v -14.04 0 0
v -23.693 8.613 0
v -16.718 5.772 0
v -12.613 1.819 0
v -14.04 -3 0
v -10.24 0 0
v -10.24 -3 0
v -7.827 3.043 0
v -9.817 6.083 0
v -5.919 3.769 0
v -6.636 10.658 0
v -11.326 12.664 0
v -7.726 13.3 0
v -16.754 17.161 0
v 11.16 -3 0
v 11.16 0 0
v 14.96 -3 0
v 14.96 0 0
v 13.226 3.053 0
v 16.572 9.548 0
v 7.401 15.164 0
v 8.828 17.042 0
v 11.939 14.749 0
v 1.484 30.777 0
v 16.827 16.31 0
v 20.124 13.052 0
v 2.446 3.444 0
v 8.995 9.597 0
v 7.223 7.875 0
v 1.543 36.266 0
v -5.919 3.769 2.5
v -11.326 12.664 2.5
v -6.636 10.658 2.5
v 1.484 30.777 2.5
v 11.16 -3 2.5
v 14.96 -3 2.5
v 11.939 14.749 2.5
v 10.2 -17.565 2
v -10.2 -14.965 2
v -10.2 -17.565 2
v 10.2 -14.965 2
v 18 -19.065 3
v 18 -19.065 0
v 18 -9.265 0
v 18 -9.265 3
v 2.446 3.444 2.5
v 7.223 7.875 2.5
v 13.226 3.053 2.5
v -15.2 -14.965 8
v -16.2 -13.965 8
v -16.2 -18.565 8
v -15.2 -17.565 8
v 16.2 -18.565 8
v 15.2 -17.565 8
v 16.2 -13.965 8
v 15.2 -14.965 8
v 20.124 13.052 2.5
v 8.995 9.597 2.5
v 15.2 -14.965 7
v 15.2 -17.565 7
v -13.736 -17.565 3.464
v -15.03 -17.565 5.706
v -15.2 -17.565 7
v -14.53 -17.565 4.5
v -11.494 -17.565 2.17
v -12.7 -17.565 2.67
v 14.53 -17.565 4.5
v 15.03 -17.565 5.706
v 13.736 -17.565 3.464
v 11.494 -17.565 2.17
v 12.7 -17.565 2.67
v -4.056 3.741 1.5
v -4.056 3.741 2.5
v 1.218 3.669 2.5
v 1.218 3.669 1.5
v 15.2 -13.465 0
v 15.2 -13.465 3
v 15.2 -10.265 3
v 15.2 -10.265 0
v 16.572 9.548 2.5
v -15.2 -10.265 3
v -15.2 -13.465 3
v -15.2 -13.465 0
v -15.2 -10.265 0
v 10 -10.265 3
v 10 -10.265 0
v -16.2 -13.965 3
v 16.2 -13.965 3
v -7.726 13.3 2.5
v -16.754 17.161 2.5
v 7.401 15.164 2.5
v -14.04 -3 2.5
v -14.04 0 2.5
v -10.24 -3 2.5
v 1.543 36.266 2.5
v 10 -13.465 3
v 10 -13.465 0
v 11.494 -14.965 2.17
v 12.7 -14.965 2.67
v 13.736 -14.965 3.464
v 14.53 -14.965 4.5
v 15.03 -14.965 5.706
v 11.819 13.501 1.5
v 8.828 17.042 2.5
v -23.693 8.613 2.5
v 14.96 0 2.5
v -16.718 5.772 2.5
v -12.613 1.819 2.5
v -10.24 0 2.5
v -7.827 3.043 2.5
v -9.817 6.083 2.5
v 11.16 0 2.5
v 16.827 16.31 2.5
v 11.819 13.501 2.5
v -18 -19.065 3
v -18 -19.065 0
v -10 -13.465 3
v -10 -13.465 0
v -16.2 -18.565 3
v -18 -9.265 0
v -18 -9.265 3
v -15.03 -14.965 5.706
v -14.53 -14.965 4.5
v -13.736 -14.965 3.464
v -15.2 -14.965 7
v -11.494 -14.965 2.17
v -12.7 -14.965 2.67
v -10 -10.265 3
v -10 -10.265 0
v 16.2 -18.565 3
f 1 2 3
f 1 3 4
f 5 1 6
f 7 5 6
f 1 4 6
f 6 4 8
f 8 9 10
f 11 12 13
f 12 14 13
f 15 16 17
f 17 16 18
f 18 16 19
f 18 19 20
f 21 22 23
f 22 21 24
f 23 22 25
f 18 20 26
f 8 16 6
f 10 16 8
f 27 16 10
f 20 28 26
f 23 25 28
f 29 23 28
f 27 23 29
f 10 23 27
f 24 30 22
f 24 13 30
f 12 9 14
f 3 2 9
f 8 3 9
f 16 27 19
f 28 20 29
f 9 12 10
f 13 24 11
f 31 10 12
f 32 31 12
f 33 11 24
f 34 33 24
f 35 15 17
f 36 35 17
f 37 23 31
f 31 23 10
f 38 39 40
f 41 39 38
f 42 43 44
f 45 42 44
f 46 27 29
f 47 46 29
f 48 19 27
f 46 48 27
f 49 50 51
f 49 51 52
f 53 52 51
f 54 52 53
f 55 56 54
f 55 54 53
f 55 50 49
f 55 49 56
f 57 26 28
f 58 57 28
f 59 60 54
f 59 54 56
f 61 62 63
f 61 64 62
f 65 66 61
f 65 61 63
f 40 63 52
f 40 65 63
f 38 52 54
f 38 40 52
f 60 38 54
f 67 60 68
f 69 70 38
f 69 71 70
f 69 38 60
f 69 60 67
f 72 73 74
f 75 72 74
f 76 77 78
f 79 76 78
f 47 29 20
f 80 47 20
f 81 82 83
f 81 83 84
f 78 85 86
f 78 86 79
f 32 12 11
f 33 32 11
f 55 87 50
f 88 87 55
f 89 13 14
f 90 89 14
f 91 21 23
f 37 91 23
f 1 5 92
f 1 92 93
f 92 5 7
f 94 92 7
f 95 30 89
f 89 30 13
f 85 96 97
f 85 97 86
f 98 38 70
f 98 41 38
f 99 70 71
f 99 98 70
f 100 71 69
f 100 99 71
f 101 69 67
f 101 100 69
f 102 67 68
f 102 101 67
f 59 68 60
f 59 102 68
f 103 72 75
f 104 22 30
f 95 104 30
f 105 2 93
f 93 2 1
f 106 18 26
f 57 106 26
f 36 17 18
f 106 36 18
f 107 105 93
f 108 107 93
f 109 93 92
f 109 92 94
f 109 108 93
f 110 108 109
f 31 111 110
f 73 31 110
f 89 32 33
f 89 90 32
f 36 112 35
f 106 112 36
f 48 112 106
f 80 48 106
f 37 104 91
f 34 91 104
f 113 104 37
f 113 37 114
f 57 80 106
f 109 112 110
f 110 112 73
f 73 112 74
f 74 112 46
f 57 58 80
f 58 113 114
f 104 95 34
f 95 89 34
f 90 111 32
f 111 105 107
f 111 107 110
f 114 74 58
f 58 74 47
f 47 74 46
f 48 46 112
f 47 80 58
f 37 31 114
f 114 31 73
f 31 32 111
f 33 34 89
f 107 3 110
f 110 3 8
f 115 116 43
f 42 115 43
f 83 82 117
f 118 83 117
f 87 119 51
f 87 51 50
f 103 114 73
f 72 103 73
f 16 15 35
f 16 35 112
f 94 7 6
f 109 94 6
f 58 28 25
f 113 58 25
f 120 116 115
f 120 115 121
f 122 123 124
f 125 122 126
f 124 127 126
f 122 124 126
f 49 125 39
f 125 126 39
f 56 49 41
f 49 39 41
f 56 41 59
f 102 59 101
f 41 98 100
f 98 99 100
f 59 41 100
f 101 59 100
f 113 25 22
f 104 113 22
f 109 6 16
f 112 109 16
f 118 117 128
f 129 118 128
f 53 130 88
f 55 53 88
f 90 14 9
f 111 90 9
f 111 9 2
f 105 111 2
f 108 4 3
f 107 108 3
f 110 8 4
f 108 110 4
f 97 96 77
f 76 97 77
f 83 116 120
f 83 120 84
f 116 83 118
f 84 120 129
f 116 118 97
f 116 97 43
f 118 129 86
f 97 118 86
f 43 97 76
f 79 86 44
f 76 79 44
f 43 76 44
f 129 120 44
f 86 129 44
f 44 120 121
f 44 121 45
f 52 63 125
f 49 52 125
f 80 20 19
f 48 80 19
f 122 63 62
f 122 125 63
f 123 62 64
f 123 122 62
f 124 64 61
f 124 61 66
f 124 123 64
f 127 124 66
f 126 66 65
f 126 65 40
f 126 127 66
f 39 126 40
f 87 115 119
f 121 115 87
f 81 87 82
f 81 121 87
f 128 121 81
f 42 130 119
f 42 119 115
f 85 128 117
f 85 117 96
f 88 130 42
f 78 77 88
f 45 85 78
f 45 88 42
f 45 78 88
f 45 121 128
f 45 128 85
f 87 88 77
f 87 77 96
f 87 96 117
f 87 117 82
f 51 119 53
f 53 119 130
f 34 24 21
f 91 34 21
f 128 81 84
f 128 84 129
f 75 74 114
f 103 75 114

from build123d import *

# Parameters (mm, degrees)
F0_W      = 3.8
F0_H      = 3
F1_DEPTH  = 2.5
F2_W      = 36
F2_H      = 9.8
F3_DEPTH  = 3
F4_W      = 5.2
F4_H      = 3.2
F5_DEPTH  = 25
F6_W      = 32.4
F6_H      = 4.6
F6_W_2    = 30.4
F6_H_2    = 2.6
F7_DEPTH  = 5
F8_DEPTH  = 1
F9_R      = 5
F11_DEPTH = 1


with BuildPart() as f1:
    # F0 (on Top) → F1 (new body)
    with BuildSketch(Plane.XY):
        Polygon((-23.693, 8.612575), (-14.039942, 0), (-10.239942, 0), (11.160058, 0), (14.960058, 0), (20.123731, 13.051745), (8.994607, 9.597098), (16.826606, 16.309944), (8.827872, 17.042117), (1.543192, 36.265995), (-7.726343, 13.299686), (-16.753706, 17.161402), (-9.817263, 6.082774), align=None)
        Polygon((-16.717711, 5.771867), (-7.826785, 3.043432), (-12.61339, 1.818523), align=None, mode=Mode.SUBTRACT)
        Polygon((2.446211, 3.444351), (7.223333, 7.875025), (16.571729, 9.547895), (13.225986, 3.053221), align=None, mode=Mode.SUBTRACT)
        Polygon((-5.918919, 3.769303), (-11.326318, 12.664368), (-6.635851, 10.657885), (1.48446, 30.776861), (7.400632, 15.164399), (11.938927, 14.748982), align=None, mode=Mode.SUBTRACT)
        with Locations((-12.139942, -1.5)):
            Rectangle(F0_W, F0_H)
        with Locations((13.060058, -1.5)):
            Rectangle(F0_W, F0_H)
    extrude(amount=F1_DEPTH)

    # F10 (on face) → F11 (cut)
    with BuildSketch(Plane.XY.offset(2.5)):
        Polygon((11.819168, 13.501456), (-4.055955, 3.74083), (1.217624, 3.668761), align=None)
    extrude(amount=-F11_DEPTH, mode=Mode.SUBTRACT)


with BuildPart() as f3:
    # F2 (on Top) → F3 (new body)
    with BuildSketch(Plane.XY):
        with Locations((0, -14.164851)):
            Rectangle(F2_W, F2_H)
    extrude(amount=F3_DEPTH)

    # F4 (on face) → F5 (cut)
    with BuildSketch(Plane.XY.offset(3)):
        with Locations((-12.6, -11.864851)):
            Rectangle(F4_W, F4_H)
        with Locations((12.6, -11.864851)):
            Rectangle(F4_W, F4_H)
    extrude(amount=-F5_DEPTH, mode=Mode.SUBTRACT)

    # F6 (on face) → F7 (join)
    with BuildSketch(Plane.XY.offset(3)):
        with Locations((0, -16.264851)):
            Rectangle(F6_W, F6_H)
        with Locations((0, -16.264851)):
            Rectangle(F6_W_2, F6_H_2, mode=Mode.SUBTRACT)
    extrude(amount=F7_DEPTH)

    # F6 (on face) → F8 (cut)
    with BuildSketch(Plane.XY.offset(3)):
        with Locations((0, -16.264851)):
            Rectangle(F6_W_2, F6_H_2)
    extrude(amount=-F8_DEPTH, mode=Mode.SUBTRACT)

    # F9
    f9_edges = [f3.edges().sort_by_distance(p)[0] for p in [
        (-15.2, -16.264851, 2),
        (15.2, -16.264851, 2),
    ]]
    fillet(f9_edges, radius=F9_R)


solid = Compound([f1.part, f3.part])
